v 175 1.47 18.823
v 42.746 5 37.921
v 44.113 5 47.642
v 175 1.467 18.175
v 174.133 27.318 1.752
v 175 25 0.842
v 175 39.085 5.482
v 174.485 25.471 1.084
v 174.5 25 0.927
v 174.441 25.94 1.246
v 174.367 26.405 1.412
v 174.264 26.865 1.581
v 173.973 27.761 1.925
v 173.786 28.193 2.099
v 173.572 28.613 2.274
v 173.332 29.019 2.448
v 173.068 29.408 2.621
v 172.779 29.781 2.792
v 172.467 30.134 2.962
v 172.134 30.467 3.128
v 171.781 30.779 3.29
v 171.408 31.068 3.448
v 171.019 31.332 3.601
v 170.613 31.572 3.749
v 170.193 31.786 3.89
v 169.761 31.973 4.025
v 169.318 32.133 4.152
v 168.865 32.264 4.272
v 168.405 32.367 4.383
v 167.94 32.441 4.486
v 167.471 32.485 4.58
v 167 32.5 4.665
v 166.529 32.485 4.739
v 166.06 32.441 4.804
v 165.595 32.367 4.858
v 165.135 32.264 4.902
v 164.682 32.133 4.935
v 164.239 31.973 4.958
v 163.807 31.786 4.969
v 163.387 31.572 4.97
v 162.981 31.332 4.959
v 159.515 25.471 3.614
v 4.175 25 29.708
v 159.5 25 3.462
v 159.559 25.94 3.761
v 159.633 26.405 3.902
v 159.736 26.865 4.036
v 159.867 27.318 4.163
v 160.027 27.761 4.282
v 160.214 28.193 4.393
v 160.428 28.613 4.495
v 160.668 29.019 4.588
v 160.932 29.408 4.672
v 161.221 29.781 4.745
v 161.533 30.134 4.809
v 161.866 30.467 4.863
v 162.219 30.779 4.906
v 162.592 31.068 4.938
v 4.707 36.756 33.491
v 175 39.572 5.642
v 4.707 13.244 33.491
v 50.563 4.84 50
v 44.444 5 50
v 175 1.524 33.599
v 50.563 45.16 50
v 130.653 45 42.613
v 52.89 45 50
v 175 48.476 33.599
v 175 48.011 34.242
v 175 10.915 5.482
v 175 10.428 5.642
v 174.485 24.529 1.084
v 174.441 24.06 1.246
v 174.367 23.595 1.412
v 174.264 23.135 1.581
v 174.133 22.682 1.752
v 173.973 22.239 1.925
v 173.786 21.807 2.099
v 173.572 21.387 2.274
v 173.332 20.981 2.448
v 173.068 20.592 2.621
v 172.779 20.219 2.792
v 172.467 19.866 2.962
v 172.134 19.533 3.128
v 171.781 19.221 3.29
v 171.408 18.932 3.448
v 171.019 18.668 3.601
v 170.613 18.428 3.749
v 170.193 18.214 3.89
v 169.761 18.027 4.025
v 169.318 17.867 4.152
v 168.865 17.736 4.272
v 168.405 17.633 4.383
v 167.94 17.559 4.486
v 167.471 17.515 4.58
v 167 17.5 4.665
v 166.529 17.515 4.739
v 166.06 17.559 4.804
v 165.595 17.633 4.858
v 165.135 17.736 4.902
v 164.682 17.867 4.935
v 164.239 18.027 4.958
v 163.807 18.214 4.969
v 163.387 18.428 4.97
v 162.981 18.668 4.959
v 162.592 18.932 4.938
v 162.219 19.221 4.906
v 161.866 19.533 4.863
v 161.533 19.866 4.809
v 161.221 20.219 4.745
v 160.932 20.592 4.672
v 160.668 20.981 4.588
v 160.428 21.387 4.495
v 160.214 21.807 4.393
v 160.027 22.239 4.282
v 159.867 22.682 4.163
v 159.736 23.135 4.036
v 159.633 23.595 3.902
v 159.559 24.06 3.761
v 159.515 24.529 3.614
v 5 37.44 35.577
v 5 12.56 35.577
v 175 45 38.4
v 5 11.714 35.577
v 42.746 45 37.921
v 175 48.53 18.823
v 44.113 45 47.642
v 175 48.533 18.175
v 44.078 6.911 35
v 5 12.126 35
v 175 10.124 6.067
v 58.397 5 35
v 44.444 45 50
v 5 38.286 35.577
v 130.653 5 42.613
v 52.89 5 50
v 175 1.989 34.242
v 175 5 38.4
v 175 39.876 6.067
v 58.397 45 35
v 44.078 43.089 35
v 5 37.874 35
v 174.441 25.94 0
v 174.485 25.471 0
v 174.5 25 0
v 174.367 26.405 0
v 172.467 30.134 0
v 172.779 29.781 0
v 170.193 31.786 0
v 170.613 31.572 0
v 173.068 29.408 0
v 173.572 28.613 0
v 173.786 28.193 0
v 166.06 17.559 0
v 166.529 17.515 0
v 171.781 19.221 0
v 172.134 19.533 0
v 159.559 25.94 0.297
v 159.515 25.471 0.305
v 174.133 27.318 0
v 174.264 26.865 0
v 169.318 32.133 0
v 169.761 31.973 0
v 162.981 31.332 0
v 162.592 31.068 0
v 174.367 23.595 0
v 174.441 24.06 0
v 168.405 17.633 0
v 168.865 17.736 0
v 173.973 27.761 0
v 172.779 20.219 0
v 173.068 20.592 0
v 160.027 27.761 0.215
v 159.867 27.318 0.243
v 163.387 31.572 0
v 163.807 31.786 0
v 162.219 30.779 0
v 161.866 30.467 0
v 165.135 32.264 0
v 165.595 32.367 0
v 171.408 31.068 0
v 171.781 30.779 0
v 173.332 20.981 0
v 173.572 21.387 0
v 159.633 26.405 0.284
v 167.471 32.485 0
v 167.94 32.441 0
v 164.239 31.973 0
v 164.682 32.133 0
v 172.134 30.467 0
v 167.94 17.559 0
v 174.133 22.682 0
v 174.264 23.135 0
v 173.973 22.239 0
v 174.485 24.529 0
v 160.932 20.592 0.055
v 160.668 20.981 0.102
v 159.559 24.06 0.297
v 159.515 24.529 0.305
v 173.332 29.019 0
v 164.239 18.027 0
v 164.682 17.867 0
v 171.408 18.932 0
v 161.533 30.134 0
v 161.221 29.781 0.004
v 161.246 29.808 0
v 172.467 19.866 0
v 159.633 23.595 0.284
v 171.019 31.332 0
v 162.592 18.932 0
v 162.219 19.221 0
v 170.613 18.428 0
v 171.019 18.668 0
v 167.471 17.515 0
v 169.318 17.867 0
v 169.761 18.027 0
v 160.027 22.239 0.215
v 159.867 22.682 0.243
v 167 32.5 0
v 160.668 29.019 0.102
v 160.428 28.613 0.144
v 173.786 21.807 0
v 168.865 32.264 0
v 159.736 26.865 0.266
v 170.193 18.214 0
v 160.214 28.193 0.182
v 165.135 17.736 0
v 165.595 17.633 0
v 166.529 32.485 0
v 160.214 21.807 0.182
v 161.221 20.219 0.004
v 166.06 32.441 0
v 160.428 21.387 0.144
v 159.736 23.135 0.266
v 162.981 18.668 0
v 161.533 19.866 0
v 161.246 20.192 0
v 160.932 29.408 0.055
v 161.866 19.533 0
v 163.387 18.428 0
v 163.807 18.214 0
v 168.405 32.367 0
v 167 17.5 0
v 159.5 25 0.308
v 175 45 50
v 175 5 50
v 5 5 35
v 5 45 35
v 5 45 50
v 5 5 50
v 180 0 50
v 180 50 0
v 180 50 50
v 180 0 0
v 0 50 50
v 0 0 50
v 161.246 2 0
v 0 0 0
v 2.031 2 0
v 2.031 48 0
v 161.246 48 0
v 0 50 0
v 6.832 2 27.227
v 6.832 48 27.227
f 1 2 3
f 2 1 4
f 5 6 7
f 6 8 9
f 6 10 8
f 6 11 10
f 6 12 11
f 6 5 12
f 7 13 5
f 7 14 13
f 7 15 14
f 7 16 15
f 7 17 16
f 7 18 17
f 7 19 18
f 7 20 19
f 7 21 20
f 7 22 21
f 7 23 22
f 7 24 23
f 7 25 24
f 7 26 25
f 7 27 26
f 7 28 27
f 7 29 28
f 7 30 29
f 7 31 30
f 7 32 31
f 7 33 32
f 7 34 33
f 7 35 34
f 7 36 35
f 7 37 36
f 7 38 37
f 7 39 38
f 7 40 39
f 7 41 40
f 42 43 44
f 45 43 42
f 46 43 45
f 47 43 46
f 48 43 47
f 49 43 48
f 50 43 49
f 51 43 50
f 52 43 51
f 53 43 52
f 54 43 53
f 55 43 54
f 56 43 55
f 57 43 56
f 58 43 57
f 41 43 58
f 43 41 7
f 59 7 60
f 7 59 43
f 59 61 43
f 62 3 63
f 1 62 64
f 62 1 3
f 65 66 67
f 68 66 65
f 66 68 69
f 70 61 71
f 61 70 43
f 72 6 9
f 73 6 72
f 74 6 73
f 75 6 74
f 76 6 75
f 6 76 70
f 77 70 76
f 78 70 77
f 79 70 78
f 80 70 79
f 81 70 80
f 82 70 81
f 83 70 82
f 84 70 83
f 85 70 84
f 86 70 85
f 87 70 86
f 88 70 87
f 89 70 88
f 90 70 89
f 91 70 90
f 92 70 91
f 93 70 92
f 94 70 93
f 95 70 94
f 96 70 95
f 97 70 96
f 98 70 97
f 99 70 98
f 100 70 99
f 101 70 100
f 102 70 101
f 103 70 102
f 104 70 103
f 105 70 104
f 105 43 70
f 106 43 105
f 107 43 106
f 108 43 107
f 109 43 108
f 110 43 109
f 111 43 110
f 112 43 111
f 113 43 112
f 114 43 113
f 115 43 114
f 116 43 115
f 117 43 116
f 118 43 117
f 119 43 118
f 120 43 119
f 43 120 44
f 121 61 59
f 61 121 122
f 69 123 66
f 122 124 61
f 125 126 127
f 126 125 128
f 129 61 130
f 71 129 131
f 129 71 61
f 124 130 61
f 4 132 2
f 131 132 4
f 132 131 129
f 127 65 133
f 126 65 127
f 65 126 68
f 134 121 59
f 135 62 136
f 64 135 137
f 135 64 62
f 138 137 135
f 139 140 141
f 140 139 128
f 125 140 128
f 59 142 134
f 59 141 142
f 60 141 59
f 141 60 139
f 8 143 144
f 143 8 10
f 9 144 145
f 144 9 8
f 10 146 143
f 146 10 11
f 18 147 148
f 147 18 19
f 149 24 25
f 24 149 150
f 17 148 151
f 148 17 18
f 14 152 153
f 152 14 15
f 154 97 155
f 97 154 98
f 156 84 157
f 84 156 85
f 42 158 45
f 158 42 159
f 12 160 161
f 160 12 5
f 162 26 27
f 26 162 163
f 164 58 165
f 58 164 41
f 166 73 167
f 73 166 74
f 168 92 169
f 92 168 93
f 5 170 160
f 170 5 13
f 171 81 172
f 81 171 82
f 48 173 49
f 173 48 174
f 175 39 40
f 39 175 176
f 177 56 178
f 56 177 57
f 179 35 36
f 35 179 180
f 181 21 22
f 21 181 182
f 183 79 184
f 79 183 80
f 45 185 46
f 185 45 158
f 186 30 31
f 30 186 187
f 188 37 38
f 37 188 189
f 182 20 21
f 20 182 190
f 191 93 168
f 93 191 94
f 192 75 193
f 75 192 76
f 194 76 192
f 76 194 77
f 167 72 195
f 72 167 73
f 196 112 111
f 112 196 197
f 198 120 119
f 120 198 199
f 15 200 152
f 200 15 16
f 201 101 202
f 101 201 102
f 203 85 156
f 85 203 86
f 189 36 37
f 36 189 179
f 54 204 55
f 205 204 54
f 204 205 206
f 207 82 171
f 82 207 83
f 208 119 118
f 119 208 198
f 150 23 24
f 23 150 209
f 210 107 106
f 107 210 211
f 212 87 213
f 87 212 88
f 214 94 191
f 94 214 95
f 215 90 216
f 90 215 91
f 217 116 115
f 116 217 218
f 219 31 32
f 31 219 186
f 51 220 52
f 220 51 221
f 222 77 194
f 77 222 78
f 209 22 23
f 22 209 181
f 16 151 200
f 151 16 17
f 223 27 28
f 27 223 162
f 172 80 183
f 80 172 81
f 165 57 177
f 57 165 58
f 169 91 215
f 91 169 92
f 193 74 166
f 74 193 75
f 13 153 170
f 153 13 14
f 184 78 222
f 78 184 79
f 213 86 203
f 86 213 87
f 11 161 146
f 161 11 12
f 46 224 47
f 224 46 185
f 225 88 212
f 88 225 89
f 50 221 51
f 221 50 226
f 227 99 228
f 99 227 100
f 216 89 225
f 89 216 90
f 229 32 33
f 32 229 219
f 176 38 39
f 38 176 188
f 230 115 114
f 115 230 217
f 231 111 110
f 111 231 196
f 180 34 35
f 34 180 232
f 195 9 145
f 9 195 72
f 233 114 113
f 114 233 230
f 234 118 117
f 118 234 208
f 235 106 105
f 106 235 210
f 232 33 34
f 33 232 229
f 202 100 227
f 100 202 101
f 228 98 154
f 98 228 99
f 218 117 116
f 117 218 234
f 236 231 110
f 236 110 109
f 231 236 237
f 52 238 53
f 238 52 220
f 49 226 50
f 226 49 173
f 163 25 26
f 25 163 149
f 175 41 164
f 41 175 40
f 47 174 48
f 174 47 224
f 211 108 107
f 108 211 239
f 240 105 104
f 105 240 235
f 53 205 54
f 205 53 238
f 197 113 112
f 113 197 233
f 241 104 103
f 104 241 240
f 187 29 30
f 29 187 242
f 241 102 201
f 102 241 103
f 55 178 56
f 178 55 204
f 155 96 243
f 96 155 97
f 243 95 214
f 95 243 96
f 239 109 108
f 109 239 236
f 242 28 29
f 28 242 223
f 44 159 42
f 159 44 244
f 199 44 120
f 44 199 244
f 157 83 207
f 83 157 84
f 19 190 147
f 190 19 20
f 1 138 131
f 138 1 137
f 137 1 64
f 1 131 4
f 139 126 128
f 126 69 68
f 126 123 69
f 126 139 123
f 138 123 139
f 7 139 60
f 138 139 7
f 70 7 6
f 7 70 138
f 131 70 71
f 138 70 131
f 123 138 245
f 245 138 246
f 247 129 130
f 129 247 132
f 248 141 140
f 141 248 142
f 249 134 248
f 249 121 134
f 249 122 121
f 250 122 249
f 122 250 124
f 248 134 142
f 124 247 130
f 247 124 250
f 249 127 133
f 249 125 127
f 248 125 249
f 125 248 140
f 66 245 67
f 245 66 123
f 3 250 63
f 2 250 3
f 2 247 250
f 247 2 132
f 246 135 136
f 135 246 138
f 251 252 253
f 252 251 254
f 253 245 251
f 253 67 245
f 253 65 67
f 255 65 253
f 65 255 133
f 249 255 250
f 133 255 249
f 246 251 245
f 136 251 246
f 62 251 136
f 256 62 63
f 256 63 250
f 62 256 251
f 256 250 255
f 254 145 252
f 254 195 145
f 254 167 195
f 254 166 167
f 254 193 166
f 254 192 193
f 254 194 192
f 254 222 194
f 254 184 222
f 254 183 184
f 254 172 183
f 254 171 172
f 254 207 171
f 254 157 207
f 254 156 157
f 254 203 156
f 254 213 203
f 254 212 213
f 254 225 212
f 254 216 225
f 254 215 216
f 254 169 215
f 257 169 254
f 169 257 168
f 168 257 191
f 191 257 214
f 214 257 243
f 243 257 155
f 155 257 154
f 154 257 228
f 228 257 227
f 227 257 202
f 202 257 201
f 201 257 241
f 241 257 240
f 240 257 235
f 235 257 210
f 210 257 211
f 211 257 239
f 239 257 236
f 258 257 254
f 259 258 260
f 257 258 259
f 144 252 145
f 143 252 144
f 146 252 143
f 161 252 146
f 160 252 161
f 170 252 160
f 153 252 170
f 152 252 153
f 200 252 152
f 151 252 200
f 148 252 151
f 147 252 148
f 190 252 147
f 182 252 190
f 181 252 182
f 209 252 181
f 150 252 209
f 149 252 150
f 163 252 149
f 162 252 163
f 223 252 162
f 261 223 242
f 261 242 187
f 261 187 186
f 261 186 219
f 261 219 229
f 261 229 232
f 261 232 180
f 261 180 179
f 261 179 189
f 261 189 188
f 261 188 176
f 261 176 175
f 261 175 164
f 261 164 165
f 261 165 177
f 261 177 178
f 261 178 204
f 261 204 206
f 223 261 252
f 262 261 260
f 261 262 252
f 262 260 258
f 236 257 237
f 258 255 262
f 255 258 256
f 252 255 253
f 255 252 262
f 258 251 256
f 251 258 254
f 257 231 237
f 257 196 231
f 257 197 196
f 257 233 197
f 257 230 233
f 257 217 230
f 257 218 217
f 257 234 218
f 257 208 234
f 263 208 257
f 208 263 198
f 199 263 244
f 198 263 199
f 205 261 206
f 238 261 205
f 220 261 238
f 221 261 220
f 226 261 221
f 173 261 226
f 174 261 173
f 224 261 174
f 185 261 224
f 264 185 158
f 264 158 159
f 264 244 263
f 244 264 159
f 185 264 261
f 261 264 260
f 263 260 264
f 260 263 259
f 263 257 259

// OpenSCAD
//Box Feeder

$fn = 10;
//Skittle dimensions
DiameterOfSkittle = 13;
ThicknessOfSkittle = 9;

//Feeder dimensions
wallThickness = 2;


feeder();

module feeder(){
    difference(){    
        box();
        cavity();
        #rotate([0,10,0])translate([2,2,-18])cube([boxLength-4,boxWidth-4,boxHeight-4]);
    }
    cover();
}

//box dimension
boxLength = 180;
boxWidth = 50;
boxHeight = 50;
module box(){
    cube([boxLength,boxWidth,boxHeight]);
}

//cavity dimension
topDiameter = boxWidth;
botDiameter = boxWidth*4/5;
//hole dimension
holeDiameter = DiameterOfSkittle + 2;

module cavity(){
    //cylinder
    rotate([0,8,0])translate([0,boxWidth/2,boxHeight])rotate([0,90,0])cylinder(d1=botDiameter,d2=topDiameter,h=boxLength);
    //hole
    translate([boxLength-holeDiameter+2,boxWidth/2,-1]) cylinder(d=holeDiameter, h= 100,$fn=100
    );
    translate([5,5,35]) cube([170,40,30]);
}

module cover(){
   translate([175,0,0])cube([5,boxWidth,boxHeight]);
}
